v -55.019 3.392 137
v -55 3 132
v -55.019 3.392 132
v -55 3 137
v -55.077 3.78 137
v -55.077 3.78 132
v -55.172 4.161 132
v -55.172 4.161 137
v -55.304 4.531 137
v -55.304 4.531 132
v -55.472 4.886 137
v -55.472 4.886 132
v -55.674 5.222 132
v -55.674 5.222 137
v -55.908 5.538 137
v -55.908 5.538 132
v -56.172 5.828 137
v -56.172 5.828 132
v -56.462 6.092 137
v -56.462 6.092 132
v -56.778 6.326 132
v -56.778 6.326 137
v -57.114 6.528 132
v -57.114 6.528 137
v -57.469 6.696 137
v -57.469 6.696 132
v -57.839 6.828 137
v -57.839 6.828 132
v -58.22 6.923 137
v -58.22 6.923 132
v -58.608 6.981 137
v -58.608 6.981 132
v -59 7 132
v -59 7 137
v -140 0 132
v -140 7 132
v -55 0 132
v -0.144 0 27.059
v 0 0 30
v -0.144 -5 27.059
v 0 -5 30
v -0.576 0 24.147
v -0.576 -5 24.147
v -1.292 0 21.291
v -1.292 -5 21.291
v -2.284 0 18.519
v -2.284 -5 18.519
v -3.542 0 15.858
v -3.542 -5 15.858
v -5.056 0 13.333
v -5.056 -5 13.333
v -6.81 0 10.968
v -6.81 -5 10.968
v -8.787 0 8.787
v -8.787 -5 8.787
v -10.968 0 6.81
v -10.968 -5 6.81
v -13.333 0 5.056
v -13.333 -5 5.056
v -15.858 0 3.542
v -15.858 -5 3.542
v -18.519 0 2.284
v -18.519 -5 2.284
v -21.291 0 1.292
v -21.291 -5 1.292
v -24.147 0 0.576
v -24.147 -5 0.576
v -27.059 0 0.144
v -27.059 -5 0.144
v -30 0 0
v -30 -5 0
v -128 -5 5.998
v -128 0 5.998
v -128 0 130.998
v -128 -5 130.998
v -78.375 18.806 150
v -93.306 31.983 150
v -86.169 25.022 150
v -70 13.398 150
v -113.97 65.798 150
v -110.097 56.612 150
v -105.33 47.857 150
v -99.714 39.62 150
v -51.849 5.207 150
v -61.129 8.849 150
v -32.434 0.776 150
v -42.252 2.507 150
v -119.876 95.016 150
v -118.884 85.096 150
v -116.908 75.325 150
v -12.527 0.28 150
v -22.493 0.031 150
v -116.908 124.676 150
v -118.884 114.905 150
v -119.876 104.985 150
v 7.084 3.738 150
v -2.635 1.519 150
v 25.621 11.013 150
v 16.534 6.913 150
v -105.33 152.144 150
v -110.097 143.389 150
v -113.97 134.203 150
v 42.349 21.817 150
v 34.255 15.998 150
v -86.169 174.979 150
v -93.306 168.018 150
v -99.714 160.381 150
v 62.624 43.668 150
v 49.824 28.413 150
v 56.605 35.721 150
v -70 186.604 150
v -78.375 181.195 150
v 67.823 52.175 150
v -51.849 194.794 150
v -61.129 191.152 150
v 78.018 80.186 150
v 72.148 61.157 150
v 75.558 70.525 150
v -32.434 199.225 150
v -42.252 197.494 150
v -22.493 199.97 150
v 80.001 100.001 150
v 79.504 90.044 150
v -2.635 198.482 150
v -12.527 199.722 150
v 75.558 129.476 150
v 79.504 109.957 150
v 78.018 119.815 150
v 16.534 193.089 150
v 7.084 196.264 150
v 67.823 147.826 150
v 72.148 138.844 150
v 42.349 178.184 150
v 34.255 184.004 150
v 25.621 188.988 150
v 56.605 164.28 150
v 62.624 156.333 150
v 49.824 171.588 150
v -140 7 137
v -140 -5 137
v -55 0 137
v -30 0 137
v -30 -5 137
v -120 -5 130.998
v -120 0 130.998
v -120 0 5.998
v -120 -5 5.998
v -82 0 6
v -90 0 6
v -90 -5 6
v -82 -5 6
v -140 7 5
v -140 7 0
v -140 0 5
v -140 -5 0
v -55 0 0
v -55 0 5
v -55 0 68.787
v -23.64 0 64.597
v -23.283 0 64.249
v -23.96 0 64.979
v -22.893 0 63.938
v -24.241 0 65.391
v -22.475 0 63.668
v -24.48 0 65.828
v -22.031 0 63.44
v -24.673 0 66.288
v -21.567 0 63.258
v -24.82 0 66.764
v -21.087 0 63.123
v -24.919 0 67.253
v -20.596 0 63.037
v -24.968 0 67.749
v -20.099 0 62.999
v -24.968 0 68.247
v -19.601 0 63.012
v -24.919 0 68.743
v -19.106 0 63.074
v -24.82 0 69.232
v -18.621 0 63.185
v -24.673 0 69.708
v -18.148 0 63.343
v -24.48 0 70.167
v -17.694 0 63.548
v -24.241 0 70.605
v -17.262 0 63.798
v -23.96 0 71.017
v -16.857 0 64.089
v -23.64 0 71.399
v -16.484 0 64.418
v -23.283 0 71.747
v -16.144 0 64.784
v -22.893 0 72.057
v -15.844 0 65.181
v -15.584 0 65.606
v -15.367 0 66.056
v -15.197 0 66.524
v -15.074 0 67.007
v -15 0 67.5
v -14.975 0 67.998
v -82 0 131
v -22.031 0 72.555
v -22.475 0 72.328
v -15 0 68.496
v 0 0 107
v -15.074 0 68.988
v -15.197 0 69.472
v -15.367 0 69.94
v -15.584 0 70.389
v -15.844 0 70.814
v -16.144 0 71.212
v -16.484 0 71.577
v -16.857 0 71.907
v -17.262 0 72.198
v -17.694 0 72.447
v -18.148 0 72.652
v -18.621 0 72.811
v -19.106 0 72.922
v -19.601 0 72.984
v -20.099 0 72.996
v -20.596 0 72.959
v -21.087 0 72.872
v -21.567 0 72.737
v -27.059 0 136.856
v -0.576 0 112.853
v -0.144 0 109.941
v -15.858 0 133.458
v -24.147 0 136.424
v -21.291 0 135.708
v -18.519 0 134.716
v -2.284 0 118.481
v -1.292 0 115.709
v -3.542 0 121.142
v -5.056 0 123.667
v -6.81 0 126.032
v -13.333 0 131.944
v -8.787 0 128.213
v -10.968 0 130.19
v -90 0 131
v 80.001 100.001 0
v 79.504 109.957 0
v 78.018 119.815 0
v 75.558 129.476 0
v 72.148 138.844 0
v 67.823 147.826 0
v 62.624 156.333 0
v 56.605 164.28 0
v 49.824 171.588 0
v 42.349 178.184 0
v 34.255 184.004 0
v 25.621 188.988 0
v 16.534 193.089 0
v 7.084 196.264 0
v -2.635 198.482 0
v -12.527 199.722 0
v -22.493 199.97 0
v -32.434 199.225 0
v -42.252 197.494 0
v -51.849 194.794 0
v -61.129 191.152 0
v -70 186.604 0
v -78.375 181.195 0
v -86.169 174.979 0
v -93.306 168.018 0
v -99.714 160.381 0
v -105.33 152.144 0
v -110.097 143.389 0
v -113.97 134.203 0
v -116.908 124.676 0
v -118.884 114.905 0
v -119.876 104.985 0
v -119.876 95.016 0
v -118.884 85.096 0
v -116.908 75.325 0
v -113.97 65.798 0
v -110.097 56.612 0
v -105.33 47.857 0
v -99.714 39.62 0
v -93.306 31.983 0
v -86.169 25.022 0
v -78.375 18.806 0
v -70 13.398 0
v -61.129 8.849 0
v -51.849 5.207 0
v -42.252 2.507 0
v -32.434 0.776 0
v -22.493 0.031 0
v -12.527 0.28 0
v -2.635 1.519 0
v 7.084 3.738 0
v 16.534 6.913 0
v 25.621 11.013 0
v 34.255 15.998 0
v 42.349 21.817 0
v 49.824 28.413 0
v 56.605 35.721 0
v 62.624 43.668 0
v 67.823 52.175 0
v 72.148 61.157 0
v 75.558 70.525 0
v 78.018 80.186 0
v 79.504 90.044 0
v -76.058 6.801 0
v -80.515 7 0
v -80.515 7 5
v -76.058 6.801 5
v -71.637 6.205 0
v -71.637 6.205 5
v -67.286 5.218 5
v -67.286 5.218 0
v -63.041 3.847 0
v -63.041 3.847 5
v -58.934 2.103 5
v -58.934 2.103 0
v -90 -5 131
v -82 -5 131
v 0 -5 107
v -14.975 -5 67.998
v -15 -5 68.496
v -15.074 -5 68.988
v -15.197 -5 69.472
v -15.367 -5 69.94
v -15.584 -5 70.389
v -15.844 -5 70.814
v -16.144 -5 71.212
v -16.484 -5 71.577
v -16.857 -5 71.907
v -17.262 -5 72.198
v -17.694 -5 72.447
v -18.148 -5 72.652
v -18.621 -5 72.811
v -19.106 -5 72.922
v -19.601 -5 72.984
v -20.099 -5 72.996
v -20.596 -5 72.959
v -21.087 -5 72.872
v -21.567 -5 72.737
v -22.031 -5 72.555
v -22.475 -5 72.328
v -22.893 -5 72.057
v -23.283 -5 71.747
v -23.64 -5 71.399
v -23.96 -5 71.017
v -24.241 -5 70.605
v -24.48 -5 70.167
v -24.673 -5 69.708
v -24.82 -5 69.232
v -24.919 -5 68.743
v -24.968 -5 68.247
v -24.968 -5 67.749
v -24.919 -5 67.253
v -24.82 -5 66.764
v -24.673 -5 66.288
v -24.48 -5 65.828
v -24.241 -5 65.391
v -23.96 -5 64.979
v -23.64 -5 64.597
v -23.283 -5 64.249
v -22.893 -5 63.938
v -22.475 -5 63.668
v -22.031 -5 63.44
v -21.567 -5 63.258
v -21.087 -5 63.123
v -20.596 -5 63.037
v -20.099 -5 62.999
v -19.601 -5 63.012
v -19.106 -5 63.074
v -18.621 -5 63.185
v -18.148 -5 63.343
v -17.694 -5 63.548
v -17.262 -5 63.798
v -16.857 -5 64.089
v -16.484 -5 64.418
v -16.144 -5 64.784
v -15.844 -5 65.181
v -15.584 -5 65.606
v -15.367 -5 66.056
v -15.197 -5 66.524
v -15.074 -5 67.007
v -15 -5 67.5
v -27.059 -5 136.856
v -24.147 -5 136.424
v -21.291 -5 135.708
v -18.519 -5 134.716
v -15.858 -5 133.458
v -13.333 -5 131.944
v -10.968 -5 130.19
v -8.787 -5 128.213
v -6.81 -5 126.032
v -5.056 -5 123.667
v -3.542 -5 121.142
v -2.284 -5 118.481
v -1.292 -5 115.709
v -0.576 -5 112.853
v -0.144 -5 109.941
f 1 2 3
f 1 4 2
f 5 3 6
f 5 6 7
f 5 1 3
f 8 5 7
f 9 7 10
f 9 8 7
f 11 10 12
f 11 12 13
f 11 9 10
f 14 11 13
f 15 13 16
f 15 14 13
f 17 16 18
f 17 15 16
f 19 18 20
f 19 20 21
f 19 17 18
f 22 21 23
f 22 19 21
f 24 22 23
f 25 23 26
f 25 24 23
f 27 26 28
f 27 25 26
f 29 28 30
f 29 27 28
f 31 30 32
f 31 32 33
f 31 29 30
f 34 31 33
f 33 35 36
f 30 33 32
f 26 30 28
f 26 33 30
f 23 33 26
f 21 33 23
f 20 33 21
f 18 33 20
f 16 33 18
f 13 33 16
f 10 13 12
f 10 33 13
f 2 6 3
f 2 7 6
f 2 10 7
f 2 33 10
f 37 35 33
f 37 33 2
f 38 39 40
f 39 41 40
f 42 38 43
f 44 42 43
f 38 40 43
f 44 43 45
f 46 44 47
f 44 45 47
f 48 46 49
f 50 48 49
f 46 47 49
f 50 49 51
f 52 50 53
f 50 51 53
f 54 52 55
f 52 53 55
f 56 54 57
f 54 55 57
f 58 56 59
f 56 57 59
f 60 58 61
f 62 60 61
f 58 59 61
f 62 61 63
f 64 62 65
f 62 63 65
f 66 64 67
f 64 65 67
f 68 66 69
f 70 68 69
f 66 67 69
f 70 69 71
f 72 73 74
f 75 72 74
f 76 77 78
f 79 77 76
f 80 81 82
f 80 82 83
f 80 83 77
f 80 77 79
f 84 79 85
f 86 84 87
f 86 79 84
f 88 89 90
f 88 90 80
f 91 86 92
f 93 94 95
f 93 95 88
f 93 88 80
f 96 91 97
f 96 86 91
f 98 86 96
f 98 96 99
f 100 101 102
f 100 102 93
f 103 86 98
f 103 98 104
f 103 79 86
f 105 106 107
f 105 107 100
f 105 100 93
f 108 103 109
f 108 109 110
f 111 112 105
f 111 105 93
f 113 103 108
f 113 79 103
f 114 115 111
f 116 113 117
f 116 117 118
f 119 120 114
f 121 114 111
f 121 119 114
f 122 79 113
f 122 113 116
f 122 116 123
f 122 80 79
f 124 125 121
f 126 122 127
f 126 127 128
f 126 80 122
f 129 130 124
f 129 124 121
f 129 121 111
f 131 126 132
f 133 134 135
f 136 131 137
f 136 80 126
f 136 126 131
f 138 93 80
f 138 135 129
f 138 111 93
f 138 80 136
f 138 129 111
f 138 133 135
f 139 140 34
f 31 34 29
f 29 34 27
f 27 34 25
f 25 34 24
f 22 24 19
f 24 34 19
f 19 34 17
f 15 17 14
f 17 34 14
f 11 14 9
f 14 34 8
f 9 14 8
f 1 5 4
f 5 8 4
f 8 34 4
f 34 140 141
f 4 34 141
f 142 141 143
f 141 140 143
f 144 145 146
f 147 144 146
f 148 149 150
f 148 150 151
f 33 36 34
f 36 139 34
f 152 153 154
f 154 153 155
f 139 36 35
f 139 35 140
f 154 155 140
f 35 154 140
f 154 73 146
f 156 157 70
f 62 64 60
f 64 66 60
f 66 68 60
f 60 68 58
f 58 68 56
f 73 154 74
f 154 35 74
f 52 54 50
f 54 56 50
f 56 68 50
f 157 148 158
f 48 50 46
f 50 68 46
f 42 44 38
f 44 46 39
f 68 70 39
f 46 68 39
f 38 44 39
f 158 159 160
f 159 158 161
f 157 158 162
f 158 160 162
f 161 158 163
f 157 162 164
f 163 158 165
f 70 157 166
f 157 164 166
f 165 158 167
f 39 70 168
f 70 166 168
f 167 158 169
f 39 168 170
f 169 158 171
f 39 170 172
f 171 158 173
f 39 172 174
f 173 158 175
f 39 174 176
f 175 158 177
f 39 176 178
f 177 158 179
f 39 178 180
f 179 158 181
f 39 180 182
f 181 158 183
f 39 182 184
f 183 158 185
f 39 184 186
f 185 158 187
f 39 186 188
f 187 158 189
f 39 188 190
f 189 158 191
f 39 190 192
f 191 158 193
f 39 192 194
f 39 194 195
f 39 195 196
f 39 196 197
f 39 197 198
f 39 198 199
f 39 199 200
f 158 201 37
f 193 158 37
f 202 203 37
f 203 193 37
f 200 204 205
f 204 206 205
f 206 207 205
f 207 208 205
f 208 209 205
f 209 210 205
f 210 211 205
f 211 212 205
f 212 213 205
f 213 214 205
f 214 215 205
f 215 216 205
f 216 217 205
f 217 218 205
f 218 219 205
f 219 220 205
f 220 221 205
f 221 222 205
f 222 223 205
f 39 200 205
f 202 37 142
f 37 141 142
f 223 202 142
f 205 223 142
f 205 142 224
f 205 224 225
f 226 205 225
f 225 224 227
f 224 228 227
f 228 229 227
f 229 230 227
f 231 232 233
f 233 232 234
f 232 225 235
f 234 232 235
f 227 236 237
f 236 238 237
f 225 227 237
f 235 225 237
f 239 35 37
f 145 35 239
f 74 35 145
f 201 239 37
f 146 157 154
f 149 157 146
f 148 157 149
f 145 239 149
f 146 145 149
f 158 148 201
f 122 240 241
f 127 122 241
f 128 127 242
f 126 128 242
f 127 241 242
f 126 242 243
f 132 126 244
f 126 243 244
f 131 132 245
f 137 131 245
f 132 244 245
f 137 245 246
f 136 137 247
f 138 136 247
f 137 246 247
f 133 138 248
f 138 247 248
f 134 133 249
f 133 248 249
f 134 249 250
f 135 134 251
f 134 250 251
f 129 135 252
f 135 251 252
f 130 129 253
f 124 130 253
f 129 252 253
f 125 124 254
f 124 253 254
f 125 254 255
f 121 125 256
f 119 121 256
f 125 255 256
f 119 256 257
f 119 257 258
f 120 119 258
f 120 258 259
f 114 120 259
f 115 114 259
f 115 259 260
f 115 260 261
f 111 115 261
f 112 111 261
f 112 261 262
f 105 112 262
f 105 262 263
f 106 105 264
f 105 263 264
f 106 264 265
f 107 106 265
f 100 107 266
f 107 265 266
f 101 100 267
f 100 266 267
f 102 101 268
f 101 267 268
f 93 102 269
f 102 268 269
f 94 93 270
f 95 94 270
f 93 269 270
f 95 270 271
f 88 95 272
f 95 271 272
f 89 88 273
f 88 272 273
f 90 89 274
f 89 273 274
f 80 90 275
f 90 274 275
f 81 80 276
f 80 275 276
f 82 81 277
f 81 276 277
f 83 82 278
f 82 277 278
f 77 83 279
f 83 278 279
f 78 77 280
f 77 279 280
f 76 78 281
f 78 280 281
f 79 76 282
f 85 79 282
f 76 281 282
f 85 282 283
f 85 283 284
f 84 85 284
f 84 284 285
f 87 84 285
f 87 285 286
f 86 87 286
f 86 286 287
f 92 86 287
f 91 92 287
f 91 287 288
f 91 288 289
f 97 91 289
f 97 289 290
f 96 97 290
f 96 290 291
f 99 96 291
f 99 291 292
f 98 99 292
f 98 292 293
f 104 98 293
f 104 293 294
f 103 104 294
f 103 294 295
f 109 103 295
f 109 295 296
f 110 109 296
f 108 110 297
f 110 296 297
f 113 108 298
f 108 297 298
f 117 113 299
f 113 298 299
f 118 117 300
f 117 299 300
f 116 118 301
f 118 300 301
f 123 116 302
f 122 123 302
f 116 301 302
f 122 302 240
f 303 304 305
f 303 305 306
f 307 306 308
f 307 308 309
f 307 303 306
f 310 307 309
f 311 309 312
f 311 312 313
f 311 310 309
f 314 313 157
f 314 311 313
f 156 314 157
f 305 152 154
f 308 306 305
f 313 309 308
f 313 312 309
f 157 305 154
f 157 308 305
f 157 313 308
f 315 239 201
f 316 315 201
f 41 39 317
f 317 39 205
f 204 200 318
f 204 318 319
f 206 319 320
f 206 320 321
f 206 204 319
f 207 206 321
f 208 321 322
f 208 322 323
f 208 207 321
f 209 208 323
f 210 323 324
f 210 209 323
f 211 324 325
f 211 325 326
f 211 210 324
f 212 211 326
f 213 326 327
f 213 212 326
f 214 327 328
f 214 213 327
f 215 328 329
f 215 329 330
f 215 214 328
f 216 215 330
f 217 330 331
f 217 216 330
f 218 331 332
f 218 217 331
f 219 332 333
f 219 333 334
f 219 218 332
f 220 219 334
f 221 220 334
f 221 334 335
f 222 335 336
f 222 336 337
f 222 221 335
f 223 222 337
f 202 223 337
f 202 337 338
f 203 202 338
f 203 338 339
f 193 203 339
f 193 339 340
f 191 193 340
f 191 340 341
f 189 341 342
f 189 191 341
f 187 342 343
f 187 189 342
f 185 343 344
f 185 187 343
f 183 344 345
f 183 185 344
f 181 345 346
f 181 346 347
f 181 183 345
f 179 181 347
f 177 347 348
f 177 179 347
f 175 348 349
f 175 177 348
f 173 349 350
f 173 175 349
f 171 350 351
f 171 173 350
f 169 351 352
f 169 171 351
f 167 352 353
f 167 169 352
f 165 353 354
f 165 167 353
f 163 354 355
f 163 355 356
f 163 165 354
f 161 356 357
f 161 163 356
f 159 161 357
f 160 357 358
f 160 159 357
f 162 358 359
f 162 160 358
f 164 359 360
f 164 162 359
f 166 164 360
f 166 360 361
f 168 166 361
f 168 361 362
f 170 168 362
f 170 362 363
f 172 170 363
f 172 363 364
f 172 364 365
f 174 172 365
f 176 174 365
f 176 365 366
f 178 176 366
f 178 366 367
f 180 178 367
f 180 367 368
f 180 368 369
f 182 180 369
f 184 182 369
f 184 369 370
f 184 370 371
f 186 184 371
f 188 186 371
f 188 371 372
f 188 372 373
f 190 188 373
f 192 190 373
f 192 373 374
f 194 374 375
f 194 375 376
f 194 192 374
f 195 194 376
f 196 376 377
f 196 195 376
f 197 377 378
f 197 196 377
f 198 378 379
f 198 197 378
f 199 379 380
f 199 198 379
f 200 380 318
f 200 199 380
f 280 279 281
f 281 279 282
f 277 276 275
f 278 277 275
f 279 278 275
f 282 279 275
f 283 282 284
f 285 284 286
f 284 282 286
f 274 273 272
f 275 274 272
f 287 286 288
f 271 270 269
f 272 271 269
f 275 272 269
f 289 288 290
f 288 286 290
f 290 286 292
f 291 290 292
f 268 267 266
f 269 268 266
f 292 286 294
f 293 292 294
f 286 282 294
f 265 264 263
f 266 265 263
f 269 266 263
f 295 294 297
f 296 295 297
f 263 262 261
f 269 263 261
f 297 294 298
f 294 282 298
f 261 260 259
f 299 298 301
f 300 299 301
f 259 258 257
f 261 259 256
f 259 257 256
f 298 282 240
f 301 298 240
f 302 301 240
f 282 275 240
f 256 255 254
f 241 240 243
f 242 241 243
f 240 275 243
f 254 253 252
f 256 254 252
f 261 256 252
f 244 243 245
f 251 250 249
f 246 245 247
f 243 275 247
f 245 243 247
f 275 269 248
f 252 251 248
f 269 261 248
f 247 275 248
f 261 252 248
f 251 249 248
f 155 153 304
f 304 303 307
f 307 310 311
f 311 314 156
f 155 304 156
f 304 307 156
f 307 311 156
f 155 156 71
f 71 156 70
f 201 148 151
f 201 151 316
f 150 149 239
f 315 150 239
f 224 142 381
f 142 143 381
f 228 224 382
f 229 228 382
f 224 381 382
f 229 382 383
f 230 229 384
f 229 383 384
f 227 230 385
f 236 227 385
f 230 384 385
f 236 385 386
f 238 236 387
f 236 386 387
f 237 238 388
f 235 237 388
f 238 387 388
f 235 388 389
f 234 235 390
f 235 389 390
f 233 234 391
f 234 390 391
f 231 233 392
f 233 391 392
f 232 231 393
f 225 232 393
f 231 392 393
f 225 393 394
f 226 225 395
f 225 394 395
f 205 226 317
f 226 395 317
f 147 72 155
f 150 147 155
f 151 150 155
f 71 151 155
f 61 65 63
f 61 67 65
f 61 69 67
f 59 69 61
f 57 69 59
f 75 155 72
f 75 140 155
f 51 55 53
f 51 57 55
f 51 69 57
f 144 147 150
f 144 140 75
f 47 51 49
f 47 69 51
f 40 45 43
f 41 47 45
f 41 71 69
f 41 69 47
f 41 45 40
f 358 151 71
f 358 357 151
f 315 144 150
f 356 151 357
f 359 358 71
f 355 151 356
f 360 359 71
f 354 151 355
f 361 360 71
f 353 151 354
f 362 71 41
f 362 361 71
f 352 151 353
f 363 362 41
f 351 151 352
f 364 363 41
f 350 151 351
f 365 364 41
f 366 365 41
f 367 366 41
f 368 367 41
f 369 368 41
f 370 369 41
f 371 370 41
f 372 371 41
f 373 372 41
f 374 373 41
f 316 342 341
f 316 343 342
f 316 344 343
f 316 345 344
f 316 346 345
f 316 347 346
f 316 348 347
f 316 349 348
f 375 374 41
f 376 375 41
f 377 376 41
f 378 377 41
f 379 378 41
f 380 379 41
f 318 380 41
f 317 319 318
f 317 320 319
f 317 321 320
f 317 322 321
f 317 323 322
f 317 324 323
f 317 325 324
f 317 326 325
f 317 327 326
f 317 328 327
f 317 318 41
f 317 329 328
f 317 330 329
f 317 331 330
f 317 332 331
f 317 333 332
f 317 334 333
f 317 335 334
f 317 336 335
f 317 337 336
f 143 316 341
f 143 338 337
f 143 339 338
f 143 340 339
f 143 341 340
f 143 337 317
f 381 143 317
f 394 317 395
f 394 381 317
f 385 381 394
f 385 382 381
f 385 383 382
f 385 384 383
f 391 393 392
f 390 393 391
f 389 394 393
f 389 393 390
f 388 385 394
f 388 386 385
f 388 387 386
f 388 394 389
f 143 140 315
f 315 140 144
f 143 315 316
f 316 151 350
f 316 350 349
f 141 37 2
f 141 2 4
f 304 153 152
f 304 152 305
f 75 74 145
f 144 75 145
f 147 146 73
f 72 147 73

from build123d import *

# Parameters (mm, degrees)
F0_W        = 140
F0_H        = 137
F0_R        = 5
F0_W_2      = 8
F0_H_2      = 125
F1_DEPTH    = 5
F2_R        = 30
F3_R        = 30
F4_W        = 85
F4_H        = 7
F5_DEPTH    = 5
F6_T1_DEPTH = 132.5735082217
F7_W        = 85
F7_H        = 5
F8_DEPTH    = 7
F9_R        = 4
F10_R       = 100.0006041304
F11_DEPTH   = 150


# Not quite as in the source:
# - a fillet or chamfer that OpenCascade refuses, or shapes differently, is made with other operations: its cross-section is extruded or revolved along the edge and cut away or added


with BuildPart() as f1:
    # F0 (on Front) → F1 (new body)
    with BuildSketch(Plane.XZ):
        with Locations((-70, 68.5)):
            Rectangle(F0_W, F0_H)
        Polygon((-128, 5.9977934385), (-128, 130.9977934385), (-120, 130.9977934385), (-120, 6), (-120, 5.9977934385), align=None, mode=Mode.SUBTRACT)
        with Locations((-19.9747101513, 67.9977461696)):
            Circle(F0_R, mode=Mode.SUBTRACT)
        with Locations((-86, 68.5)):
            Rectangle(F0_W_2, F0_H_2, mode=Mode.SUBTRACT)
    extrude(amount=F1_DEPTH)

    # F2
    f2_edges = [f1.edges().sort_by_distance(p)[0] for p in [
        (0, -2.5, 137),
    ]]
    fillet(f2_edges, radius=F2_R)

    # F3
    f3_edges = [f1.edges().sort_by_distance(p)[0] for p in [
        (0, -2.5, 0),
    ]]
    fillet(f3_edges, radius=F3_R)

    # F4 (on Top) → F5 (join)
    with BuildSketch(Plane.XY):
        with Locations((-97.5, 3.5)):
            Rectangle(F4_W, F4_H)
    extrude(amount=F5_DEPTH)

    # F6: fillet of radius 50 on 1 edges, made by hand

    # F6_s2 → F6_t1 (cut)
    with BuildSketch(Plane.XY.offset(-63.7867541109)):
        with BuildLine():
            ThreePointArc((-80.5147016443, 7), (-67.285945089, 5.218253805), (-55, 0))
            Line((-55, 0), (-55, 7))
            Line((-55, 7), (-80.5147016443, 7))
        make_face()
    extrude(amount=F6_T1_DEPTH, mode=Mode.SUBTRACT)

    # F7 (on Front) → F8 (join)
    with BuildSketch(Plane.XZ):
        with Locations((-97.5, 134.5)):
            Rectangle(F7_W, F7_H)
    extrude(amount=-F8_DEPTH)

    # F9
    f9_edges = [f1.edges().sort_by_distance(p)[0] for p in [
        (-55, 7, 134.5),
    ]]
    fillet(f9_edges, radius=F9_R)


with BuildPart() as f11:
    # F10 (on Top) → F11 (new body)
    with BuildSketch(Plane.XY):
        with Locations((-19.999999553, 100.0006041304)):
            Circle(F10_R)
    extrude(amount=F11_DEPTH)


solid = Compound([f1.part, f11.part])
